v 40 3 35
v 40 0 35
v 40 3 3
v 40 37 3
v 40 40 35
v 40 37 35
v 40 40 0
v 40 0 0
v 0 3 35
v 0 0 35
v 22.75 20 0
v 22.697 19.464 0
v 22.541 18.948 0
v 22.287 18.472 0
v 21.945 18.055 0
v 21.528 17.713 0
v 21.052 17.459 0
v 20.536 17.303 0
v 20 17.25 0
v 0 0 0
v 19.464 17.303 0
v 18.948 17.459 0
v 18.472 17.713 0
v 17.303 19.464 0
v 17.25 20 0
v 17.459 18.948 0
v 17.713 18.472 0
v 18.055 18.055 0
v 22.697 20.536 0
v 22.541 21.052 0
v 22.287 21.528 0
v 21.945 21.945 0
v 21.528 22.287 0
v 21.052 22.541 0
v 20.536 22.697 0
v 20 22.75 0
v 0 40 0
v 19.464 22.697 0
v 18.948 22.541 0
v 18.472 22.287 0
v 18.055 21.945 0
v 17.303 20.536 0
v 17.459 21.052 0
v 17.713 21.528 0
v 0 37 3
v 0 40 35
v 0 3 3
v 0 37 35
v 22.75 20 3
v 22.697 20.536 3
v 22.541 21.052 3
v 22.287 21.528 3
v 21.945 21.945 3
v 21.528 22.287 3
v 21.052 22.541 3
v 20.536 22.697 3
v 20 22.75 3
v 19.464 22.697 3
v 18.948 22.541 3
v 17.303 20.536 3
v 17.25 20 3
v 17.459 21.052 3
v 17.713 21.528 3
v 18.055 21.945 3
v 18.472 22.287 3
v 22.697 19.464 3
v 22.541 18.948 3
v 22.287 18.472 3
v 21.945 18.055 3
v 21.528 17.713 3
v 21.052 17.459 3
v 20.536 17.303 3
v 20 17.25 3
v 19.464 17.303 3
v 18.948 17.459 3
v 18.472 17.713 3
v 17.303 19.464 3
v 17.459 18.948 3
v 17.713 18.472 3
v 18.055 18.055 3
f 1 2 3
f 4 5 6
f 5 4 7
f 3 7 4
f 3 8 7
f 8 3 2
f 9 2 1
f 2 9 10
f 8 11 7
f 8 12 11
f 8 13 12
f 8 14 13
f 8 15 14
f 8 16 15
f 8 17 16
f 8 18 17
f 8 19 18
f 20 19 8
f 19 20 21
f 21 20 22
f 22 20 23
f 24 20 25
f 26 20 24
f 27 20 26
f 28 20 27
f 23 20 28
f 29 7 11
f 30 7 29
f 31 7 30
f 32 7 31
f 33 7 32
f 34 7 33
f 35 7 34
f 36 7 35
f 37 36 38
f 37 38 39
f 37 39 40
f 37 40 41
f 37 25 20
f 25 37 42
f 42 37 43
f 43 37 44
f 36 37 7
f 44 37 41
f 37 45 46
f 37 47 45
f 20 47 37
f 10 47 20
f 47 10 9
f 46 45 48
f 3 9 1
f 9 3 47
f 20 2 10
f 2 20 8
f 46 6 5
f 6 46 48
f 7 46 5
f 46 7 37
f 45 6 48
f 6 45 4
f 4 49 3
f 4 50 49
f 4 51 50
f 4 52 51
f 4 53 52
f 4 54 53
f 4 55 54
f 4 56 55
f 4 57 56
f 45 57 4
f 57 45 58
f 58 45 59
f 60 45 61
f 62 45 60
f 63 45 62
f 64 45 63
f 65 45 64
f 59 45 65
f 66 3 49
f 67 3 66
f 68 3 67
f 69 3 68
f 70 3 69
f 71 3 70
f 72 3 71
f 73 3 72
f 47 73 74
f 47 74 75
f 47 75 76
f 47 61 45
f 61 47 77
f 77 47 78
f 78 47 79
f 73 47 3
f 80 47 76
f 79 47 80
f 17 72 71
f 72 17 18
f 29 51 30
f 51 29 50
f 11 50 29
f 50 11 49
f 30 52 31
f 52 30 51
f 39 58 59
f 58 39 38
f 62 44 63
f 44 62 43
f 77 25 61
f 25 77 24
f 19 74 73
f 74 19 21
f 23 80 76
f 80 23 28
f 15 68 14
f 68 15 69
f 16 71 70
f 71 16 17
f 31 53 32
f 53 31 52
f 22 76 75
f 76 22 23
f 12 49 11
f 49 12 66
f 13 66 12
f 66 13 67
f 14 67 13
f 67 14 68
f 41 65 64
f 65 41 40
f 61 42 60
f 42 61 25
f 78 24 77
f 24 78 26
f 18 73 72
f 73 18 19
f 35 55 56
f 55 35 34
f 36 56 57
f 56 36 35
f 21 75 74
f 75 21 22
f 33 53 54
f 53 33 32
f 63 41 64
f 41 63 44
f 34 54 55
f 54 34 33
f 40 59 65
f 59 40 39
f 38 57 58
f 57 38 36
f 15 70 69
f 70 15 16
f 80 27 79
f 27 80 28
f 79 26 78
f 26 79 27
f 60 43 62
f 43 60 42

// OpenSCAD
$fn = 32;

// ----------------------------------------------------------------------
// U-bracket: 40 x 40 x 35 mm
// ----------------------------------------------------------------------

// --- parameters (mm) ---
span = 40;                // outer length, X
outer_w = 40;             // outer width, Y
wall_h = 35;              // upright height, Z
plate_t = 3;              // wall thickness
hole_d = 5.5;             // clearance for M5

module hole_z(px, py) {
  translate([px, py, -0.5]) cylinder(h = plate_t + 1, d = hole_d);
}
module hole_y_pz(pz) {
  /* through both uprights along Y */
  translate([0, -0.5, pz]) rotate([-90, 0, 0]) cylinder(h = outer_w + 1, d = hole_d);
}

module base() {
  cube([span, outer_w, plate_t]);
}

module uprights() {
  cube([span, plate_t, wall_h]);
  translate([0, outer_w - plate_t, 0]) cube([span, plate_t, wall_h]);
}

difference() {
  union() {
    base();
    uprights();
  }
  hole_z(20, 20);
}
